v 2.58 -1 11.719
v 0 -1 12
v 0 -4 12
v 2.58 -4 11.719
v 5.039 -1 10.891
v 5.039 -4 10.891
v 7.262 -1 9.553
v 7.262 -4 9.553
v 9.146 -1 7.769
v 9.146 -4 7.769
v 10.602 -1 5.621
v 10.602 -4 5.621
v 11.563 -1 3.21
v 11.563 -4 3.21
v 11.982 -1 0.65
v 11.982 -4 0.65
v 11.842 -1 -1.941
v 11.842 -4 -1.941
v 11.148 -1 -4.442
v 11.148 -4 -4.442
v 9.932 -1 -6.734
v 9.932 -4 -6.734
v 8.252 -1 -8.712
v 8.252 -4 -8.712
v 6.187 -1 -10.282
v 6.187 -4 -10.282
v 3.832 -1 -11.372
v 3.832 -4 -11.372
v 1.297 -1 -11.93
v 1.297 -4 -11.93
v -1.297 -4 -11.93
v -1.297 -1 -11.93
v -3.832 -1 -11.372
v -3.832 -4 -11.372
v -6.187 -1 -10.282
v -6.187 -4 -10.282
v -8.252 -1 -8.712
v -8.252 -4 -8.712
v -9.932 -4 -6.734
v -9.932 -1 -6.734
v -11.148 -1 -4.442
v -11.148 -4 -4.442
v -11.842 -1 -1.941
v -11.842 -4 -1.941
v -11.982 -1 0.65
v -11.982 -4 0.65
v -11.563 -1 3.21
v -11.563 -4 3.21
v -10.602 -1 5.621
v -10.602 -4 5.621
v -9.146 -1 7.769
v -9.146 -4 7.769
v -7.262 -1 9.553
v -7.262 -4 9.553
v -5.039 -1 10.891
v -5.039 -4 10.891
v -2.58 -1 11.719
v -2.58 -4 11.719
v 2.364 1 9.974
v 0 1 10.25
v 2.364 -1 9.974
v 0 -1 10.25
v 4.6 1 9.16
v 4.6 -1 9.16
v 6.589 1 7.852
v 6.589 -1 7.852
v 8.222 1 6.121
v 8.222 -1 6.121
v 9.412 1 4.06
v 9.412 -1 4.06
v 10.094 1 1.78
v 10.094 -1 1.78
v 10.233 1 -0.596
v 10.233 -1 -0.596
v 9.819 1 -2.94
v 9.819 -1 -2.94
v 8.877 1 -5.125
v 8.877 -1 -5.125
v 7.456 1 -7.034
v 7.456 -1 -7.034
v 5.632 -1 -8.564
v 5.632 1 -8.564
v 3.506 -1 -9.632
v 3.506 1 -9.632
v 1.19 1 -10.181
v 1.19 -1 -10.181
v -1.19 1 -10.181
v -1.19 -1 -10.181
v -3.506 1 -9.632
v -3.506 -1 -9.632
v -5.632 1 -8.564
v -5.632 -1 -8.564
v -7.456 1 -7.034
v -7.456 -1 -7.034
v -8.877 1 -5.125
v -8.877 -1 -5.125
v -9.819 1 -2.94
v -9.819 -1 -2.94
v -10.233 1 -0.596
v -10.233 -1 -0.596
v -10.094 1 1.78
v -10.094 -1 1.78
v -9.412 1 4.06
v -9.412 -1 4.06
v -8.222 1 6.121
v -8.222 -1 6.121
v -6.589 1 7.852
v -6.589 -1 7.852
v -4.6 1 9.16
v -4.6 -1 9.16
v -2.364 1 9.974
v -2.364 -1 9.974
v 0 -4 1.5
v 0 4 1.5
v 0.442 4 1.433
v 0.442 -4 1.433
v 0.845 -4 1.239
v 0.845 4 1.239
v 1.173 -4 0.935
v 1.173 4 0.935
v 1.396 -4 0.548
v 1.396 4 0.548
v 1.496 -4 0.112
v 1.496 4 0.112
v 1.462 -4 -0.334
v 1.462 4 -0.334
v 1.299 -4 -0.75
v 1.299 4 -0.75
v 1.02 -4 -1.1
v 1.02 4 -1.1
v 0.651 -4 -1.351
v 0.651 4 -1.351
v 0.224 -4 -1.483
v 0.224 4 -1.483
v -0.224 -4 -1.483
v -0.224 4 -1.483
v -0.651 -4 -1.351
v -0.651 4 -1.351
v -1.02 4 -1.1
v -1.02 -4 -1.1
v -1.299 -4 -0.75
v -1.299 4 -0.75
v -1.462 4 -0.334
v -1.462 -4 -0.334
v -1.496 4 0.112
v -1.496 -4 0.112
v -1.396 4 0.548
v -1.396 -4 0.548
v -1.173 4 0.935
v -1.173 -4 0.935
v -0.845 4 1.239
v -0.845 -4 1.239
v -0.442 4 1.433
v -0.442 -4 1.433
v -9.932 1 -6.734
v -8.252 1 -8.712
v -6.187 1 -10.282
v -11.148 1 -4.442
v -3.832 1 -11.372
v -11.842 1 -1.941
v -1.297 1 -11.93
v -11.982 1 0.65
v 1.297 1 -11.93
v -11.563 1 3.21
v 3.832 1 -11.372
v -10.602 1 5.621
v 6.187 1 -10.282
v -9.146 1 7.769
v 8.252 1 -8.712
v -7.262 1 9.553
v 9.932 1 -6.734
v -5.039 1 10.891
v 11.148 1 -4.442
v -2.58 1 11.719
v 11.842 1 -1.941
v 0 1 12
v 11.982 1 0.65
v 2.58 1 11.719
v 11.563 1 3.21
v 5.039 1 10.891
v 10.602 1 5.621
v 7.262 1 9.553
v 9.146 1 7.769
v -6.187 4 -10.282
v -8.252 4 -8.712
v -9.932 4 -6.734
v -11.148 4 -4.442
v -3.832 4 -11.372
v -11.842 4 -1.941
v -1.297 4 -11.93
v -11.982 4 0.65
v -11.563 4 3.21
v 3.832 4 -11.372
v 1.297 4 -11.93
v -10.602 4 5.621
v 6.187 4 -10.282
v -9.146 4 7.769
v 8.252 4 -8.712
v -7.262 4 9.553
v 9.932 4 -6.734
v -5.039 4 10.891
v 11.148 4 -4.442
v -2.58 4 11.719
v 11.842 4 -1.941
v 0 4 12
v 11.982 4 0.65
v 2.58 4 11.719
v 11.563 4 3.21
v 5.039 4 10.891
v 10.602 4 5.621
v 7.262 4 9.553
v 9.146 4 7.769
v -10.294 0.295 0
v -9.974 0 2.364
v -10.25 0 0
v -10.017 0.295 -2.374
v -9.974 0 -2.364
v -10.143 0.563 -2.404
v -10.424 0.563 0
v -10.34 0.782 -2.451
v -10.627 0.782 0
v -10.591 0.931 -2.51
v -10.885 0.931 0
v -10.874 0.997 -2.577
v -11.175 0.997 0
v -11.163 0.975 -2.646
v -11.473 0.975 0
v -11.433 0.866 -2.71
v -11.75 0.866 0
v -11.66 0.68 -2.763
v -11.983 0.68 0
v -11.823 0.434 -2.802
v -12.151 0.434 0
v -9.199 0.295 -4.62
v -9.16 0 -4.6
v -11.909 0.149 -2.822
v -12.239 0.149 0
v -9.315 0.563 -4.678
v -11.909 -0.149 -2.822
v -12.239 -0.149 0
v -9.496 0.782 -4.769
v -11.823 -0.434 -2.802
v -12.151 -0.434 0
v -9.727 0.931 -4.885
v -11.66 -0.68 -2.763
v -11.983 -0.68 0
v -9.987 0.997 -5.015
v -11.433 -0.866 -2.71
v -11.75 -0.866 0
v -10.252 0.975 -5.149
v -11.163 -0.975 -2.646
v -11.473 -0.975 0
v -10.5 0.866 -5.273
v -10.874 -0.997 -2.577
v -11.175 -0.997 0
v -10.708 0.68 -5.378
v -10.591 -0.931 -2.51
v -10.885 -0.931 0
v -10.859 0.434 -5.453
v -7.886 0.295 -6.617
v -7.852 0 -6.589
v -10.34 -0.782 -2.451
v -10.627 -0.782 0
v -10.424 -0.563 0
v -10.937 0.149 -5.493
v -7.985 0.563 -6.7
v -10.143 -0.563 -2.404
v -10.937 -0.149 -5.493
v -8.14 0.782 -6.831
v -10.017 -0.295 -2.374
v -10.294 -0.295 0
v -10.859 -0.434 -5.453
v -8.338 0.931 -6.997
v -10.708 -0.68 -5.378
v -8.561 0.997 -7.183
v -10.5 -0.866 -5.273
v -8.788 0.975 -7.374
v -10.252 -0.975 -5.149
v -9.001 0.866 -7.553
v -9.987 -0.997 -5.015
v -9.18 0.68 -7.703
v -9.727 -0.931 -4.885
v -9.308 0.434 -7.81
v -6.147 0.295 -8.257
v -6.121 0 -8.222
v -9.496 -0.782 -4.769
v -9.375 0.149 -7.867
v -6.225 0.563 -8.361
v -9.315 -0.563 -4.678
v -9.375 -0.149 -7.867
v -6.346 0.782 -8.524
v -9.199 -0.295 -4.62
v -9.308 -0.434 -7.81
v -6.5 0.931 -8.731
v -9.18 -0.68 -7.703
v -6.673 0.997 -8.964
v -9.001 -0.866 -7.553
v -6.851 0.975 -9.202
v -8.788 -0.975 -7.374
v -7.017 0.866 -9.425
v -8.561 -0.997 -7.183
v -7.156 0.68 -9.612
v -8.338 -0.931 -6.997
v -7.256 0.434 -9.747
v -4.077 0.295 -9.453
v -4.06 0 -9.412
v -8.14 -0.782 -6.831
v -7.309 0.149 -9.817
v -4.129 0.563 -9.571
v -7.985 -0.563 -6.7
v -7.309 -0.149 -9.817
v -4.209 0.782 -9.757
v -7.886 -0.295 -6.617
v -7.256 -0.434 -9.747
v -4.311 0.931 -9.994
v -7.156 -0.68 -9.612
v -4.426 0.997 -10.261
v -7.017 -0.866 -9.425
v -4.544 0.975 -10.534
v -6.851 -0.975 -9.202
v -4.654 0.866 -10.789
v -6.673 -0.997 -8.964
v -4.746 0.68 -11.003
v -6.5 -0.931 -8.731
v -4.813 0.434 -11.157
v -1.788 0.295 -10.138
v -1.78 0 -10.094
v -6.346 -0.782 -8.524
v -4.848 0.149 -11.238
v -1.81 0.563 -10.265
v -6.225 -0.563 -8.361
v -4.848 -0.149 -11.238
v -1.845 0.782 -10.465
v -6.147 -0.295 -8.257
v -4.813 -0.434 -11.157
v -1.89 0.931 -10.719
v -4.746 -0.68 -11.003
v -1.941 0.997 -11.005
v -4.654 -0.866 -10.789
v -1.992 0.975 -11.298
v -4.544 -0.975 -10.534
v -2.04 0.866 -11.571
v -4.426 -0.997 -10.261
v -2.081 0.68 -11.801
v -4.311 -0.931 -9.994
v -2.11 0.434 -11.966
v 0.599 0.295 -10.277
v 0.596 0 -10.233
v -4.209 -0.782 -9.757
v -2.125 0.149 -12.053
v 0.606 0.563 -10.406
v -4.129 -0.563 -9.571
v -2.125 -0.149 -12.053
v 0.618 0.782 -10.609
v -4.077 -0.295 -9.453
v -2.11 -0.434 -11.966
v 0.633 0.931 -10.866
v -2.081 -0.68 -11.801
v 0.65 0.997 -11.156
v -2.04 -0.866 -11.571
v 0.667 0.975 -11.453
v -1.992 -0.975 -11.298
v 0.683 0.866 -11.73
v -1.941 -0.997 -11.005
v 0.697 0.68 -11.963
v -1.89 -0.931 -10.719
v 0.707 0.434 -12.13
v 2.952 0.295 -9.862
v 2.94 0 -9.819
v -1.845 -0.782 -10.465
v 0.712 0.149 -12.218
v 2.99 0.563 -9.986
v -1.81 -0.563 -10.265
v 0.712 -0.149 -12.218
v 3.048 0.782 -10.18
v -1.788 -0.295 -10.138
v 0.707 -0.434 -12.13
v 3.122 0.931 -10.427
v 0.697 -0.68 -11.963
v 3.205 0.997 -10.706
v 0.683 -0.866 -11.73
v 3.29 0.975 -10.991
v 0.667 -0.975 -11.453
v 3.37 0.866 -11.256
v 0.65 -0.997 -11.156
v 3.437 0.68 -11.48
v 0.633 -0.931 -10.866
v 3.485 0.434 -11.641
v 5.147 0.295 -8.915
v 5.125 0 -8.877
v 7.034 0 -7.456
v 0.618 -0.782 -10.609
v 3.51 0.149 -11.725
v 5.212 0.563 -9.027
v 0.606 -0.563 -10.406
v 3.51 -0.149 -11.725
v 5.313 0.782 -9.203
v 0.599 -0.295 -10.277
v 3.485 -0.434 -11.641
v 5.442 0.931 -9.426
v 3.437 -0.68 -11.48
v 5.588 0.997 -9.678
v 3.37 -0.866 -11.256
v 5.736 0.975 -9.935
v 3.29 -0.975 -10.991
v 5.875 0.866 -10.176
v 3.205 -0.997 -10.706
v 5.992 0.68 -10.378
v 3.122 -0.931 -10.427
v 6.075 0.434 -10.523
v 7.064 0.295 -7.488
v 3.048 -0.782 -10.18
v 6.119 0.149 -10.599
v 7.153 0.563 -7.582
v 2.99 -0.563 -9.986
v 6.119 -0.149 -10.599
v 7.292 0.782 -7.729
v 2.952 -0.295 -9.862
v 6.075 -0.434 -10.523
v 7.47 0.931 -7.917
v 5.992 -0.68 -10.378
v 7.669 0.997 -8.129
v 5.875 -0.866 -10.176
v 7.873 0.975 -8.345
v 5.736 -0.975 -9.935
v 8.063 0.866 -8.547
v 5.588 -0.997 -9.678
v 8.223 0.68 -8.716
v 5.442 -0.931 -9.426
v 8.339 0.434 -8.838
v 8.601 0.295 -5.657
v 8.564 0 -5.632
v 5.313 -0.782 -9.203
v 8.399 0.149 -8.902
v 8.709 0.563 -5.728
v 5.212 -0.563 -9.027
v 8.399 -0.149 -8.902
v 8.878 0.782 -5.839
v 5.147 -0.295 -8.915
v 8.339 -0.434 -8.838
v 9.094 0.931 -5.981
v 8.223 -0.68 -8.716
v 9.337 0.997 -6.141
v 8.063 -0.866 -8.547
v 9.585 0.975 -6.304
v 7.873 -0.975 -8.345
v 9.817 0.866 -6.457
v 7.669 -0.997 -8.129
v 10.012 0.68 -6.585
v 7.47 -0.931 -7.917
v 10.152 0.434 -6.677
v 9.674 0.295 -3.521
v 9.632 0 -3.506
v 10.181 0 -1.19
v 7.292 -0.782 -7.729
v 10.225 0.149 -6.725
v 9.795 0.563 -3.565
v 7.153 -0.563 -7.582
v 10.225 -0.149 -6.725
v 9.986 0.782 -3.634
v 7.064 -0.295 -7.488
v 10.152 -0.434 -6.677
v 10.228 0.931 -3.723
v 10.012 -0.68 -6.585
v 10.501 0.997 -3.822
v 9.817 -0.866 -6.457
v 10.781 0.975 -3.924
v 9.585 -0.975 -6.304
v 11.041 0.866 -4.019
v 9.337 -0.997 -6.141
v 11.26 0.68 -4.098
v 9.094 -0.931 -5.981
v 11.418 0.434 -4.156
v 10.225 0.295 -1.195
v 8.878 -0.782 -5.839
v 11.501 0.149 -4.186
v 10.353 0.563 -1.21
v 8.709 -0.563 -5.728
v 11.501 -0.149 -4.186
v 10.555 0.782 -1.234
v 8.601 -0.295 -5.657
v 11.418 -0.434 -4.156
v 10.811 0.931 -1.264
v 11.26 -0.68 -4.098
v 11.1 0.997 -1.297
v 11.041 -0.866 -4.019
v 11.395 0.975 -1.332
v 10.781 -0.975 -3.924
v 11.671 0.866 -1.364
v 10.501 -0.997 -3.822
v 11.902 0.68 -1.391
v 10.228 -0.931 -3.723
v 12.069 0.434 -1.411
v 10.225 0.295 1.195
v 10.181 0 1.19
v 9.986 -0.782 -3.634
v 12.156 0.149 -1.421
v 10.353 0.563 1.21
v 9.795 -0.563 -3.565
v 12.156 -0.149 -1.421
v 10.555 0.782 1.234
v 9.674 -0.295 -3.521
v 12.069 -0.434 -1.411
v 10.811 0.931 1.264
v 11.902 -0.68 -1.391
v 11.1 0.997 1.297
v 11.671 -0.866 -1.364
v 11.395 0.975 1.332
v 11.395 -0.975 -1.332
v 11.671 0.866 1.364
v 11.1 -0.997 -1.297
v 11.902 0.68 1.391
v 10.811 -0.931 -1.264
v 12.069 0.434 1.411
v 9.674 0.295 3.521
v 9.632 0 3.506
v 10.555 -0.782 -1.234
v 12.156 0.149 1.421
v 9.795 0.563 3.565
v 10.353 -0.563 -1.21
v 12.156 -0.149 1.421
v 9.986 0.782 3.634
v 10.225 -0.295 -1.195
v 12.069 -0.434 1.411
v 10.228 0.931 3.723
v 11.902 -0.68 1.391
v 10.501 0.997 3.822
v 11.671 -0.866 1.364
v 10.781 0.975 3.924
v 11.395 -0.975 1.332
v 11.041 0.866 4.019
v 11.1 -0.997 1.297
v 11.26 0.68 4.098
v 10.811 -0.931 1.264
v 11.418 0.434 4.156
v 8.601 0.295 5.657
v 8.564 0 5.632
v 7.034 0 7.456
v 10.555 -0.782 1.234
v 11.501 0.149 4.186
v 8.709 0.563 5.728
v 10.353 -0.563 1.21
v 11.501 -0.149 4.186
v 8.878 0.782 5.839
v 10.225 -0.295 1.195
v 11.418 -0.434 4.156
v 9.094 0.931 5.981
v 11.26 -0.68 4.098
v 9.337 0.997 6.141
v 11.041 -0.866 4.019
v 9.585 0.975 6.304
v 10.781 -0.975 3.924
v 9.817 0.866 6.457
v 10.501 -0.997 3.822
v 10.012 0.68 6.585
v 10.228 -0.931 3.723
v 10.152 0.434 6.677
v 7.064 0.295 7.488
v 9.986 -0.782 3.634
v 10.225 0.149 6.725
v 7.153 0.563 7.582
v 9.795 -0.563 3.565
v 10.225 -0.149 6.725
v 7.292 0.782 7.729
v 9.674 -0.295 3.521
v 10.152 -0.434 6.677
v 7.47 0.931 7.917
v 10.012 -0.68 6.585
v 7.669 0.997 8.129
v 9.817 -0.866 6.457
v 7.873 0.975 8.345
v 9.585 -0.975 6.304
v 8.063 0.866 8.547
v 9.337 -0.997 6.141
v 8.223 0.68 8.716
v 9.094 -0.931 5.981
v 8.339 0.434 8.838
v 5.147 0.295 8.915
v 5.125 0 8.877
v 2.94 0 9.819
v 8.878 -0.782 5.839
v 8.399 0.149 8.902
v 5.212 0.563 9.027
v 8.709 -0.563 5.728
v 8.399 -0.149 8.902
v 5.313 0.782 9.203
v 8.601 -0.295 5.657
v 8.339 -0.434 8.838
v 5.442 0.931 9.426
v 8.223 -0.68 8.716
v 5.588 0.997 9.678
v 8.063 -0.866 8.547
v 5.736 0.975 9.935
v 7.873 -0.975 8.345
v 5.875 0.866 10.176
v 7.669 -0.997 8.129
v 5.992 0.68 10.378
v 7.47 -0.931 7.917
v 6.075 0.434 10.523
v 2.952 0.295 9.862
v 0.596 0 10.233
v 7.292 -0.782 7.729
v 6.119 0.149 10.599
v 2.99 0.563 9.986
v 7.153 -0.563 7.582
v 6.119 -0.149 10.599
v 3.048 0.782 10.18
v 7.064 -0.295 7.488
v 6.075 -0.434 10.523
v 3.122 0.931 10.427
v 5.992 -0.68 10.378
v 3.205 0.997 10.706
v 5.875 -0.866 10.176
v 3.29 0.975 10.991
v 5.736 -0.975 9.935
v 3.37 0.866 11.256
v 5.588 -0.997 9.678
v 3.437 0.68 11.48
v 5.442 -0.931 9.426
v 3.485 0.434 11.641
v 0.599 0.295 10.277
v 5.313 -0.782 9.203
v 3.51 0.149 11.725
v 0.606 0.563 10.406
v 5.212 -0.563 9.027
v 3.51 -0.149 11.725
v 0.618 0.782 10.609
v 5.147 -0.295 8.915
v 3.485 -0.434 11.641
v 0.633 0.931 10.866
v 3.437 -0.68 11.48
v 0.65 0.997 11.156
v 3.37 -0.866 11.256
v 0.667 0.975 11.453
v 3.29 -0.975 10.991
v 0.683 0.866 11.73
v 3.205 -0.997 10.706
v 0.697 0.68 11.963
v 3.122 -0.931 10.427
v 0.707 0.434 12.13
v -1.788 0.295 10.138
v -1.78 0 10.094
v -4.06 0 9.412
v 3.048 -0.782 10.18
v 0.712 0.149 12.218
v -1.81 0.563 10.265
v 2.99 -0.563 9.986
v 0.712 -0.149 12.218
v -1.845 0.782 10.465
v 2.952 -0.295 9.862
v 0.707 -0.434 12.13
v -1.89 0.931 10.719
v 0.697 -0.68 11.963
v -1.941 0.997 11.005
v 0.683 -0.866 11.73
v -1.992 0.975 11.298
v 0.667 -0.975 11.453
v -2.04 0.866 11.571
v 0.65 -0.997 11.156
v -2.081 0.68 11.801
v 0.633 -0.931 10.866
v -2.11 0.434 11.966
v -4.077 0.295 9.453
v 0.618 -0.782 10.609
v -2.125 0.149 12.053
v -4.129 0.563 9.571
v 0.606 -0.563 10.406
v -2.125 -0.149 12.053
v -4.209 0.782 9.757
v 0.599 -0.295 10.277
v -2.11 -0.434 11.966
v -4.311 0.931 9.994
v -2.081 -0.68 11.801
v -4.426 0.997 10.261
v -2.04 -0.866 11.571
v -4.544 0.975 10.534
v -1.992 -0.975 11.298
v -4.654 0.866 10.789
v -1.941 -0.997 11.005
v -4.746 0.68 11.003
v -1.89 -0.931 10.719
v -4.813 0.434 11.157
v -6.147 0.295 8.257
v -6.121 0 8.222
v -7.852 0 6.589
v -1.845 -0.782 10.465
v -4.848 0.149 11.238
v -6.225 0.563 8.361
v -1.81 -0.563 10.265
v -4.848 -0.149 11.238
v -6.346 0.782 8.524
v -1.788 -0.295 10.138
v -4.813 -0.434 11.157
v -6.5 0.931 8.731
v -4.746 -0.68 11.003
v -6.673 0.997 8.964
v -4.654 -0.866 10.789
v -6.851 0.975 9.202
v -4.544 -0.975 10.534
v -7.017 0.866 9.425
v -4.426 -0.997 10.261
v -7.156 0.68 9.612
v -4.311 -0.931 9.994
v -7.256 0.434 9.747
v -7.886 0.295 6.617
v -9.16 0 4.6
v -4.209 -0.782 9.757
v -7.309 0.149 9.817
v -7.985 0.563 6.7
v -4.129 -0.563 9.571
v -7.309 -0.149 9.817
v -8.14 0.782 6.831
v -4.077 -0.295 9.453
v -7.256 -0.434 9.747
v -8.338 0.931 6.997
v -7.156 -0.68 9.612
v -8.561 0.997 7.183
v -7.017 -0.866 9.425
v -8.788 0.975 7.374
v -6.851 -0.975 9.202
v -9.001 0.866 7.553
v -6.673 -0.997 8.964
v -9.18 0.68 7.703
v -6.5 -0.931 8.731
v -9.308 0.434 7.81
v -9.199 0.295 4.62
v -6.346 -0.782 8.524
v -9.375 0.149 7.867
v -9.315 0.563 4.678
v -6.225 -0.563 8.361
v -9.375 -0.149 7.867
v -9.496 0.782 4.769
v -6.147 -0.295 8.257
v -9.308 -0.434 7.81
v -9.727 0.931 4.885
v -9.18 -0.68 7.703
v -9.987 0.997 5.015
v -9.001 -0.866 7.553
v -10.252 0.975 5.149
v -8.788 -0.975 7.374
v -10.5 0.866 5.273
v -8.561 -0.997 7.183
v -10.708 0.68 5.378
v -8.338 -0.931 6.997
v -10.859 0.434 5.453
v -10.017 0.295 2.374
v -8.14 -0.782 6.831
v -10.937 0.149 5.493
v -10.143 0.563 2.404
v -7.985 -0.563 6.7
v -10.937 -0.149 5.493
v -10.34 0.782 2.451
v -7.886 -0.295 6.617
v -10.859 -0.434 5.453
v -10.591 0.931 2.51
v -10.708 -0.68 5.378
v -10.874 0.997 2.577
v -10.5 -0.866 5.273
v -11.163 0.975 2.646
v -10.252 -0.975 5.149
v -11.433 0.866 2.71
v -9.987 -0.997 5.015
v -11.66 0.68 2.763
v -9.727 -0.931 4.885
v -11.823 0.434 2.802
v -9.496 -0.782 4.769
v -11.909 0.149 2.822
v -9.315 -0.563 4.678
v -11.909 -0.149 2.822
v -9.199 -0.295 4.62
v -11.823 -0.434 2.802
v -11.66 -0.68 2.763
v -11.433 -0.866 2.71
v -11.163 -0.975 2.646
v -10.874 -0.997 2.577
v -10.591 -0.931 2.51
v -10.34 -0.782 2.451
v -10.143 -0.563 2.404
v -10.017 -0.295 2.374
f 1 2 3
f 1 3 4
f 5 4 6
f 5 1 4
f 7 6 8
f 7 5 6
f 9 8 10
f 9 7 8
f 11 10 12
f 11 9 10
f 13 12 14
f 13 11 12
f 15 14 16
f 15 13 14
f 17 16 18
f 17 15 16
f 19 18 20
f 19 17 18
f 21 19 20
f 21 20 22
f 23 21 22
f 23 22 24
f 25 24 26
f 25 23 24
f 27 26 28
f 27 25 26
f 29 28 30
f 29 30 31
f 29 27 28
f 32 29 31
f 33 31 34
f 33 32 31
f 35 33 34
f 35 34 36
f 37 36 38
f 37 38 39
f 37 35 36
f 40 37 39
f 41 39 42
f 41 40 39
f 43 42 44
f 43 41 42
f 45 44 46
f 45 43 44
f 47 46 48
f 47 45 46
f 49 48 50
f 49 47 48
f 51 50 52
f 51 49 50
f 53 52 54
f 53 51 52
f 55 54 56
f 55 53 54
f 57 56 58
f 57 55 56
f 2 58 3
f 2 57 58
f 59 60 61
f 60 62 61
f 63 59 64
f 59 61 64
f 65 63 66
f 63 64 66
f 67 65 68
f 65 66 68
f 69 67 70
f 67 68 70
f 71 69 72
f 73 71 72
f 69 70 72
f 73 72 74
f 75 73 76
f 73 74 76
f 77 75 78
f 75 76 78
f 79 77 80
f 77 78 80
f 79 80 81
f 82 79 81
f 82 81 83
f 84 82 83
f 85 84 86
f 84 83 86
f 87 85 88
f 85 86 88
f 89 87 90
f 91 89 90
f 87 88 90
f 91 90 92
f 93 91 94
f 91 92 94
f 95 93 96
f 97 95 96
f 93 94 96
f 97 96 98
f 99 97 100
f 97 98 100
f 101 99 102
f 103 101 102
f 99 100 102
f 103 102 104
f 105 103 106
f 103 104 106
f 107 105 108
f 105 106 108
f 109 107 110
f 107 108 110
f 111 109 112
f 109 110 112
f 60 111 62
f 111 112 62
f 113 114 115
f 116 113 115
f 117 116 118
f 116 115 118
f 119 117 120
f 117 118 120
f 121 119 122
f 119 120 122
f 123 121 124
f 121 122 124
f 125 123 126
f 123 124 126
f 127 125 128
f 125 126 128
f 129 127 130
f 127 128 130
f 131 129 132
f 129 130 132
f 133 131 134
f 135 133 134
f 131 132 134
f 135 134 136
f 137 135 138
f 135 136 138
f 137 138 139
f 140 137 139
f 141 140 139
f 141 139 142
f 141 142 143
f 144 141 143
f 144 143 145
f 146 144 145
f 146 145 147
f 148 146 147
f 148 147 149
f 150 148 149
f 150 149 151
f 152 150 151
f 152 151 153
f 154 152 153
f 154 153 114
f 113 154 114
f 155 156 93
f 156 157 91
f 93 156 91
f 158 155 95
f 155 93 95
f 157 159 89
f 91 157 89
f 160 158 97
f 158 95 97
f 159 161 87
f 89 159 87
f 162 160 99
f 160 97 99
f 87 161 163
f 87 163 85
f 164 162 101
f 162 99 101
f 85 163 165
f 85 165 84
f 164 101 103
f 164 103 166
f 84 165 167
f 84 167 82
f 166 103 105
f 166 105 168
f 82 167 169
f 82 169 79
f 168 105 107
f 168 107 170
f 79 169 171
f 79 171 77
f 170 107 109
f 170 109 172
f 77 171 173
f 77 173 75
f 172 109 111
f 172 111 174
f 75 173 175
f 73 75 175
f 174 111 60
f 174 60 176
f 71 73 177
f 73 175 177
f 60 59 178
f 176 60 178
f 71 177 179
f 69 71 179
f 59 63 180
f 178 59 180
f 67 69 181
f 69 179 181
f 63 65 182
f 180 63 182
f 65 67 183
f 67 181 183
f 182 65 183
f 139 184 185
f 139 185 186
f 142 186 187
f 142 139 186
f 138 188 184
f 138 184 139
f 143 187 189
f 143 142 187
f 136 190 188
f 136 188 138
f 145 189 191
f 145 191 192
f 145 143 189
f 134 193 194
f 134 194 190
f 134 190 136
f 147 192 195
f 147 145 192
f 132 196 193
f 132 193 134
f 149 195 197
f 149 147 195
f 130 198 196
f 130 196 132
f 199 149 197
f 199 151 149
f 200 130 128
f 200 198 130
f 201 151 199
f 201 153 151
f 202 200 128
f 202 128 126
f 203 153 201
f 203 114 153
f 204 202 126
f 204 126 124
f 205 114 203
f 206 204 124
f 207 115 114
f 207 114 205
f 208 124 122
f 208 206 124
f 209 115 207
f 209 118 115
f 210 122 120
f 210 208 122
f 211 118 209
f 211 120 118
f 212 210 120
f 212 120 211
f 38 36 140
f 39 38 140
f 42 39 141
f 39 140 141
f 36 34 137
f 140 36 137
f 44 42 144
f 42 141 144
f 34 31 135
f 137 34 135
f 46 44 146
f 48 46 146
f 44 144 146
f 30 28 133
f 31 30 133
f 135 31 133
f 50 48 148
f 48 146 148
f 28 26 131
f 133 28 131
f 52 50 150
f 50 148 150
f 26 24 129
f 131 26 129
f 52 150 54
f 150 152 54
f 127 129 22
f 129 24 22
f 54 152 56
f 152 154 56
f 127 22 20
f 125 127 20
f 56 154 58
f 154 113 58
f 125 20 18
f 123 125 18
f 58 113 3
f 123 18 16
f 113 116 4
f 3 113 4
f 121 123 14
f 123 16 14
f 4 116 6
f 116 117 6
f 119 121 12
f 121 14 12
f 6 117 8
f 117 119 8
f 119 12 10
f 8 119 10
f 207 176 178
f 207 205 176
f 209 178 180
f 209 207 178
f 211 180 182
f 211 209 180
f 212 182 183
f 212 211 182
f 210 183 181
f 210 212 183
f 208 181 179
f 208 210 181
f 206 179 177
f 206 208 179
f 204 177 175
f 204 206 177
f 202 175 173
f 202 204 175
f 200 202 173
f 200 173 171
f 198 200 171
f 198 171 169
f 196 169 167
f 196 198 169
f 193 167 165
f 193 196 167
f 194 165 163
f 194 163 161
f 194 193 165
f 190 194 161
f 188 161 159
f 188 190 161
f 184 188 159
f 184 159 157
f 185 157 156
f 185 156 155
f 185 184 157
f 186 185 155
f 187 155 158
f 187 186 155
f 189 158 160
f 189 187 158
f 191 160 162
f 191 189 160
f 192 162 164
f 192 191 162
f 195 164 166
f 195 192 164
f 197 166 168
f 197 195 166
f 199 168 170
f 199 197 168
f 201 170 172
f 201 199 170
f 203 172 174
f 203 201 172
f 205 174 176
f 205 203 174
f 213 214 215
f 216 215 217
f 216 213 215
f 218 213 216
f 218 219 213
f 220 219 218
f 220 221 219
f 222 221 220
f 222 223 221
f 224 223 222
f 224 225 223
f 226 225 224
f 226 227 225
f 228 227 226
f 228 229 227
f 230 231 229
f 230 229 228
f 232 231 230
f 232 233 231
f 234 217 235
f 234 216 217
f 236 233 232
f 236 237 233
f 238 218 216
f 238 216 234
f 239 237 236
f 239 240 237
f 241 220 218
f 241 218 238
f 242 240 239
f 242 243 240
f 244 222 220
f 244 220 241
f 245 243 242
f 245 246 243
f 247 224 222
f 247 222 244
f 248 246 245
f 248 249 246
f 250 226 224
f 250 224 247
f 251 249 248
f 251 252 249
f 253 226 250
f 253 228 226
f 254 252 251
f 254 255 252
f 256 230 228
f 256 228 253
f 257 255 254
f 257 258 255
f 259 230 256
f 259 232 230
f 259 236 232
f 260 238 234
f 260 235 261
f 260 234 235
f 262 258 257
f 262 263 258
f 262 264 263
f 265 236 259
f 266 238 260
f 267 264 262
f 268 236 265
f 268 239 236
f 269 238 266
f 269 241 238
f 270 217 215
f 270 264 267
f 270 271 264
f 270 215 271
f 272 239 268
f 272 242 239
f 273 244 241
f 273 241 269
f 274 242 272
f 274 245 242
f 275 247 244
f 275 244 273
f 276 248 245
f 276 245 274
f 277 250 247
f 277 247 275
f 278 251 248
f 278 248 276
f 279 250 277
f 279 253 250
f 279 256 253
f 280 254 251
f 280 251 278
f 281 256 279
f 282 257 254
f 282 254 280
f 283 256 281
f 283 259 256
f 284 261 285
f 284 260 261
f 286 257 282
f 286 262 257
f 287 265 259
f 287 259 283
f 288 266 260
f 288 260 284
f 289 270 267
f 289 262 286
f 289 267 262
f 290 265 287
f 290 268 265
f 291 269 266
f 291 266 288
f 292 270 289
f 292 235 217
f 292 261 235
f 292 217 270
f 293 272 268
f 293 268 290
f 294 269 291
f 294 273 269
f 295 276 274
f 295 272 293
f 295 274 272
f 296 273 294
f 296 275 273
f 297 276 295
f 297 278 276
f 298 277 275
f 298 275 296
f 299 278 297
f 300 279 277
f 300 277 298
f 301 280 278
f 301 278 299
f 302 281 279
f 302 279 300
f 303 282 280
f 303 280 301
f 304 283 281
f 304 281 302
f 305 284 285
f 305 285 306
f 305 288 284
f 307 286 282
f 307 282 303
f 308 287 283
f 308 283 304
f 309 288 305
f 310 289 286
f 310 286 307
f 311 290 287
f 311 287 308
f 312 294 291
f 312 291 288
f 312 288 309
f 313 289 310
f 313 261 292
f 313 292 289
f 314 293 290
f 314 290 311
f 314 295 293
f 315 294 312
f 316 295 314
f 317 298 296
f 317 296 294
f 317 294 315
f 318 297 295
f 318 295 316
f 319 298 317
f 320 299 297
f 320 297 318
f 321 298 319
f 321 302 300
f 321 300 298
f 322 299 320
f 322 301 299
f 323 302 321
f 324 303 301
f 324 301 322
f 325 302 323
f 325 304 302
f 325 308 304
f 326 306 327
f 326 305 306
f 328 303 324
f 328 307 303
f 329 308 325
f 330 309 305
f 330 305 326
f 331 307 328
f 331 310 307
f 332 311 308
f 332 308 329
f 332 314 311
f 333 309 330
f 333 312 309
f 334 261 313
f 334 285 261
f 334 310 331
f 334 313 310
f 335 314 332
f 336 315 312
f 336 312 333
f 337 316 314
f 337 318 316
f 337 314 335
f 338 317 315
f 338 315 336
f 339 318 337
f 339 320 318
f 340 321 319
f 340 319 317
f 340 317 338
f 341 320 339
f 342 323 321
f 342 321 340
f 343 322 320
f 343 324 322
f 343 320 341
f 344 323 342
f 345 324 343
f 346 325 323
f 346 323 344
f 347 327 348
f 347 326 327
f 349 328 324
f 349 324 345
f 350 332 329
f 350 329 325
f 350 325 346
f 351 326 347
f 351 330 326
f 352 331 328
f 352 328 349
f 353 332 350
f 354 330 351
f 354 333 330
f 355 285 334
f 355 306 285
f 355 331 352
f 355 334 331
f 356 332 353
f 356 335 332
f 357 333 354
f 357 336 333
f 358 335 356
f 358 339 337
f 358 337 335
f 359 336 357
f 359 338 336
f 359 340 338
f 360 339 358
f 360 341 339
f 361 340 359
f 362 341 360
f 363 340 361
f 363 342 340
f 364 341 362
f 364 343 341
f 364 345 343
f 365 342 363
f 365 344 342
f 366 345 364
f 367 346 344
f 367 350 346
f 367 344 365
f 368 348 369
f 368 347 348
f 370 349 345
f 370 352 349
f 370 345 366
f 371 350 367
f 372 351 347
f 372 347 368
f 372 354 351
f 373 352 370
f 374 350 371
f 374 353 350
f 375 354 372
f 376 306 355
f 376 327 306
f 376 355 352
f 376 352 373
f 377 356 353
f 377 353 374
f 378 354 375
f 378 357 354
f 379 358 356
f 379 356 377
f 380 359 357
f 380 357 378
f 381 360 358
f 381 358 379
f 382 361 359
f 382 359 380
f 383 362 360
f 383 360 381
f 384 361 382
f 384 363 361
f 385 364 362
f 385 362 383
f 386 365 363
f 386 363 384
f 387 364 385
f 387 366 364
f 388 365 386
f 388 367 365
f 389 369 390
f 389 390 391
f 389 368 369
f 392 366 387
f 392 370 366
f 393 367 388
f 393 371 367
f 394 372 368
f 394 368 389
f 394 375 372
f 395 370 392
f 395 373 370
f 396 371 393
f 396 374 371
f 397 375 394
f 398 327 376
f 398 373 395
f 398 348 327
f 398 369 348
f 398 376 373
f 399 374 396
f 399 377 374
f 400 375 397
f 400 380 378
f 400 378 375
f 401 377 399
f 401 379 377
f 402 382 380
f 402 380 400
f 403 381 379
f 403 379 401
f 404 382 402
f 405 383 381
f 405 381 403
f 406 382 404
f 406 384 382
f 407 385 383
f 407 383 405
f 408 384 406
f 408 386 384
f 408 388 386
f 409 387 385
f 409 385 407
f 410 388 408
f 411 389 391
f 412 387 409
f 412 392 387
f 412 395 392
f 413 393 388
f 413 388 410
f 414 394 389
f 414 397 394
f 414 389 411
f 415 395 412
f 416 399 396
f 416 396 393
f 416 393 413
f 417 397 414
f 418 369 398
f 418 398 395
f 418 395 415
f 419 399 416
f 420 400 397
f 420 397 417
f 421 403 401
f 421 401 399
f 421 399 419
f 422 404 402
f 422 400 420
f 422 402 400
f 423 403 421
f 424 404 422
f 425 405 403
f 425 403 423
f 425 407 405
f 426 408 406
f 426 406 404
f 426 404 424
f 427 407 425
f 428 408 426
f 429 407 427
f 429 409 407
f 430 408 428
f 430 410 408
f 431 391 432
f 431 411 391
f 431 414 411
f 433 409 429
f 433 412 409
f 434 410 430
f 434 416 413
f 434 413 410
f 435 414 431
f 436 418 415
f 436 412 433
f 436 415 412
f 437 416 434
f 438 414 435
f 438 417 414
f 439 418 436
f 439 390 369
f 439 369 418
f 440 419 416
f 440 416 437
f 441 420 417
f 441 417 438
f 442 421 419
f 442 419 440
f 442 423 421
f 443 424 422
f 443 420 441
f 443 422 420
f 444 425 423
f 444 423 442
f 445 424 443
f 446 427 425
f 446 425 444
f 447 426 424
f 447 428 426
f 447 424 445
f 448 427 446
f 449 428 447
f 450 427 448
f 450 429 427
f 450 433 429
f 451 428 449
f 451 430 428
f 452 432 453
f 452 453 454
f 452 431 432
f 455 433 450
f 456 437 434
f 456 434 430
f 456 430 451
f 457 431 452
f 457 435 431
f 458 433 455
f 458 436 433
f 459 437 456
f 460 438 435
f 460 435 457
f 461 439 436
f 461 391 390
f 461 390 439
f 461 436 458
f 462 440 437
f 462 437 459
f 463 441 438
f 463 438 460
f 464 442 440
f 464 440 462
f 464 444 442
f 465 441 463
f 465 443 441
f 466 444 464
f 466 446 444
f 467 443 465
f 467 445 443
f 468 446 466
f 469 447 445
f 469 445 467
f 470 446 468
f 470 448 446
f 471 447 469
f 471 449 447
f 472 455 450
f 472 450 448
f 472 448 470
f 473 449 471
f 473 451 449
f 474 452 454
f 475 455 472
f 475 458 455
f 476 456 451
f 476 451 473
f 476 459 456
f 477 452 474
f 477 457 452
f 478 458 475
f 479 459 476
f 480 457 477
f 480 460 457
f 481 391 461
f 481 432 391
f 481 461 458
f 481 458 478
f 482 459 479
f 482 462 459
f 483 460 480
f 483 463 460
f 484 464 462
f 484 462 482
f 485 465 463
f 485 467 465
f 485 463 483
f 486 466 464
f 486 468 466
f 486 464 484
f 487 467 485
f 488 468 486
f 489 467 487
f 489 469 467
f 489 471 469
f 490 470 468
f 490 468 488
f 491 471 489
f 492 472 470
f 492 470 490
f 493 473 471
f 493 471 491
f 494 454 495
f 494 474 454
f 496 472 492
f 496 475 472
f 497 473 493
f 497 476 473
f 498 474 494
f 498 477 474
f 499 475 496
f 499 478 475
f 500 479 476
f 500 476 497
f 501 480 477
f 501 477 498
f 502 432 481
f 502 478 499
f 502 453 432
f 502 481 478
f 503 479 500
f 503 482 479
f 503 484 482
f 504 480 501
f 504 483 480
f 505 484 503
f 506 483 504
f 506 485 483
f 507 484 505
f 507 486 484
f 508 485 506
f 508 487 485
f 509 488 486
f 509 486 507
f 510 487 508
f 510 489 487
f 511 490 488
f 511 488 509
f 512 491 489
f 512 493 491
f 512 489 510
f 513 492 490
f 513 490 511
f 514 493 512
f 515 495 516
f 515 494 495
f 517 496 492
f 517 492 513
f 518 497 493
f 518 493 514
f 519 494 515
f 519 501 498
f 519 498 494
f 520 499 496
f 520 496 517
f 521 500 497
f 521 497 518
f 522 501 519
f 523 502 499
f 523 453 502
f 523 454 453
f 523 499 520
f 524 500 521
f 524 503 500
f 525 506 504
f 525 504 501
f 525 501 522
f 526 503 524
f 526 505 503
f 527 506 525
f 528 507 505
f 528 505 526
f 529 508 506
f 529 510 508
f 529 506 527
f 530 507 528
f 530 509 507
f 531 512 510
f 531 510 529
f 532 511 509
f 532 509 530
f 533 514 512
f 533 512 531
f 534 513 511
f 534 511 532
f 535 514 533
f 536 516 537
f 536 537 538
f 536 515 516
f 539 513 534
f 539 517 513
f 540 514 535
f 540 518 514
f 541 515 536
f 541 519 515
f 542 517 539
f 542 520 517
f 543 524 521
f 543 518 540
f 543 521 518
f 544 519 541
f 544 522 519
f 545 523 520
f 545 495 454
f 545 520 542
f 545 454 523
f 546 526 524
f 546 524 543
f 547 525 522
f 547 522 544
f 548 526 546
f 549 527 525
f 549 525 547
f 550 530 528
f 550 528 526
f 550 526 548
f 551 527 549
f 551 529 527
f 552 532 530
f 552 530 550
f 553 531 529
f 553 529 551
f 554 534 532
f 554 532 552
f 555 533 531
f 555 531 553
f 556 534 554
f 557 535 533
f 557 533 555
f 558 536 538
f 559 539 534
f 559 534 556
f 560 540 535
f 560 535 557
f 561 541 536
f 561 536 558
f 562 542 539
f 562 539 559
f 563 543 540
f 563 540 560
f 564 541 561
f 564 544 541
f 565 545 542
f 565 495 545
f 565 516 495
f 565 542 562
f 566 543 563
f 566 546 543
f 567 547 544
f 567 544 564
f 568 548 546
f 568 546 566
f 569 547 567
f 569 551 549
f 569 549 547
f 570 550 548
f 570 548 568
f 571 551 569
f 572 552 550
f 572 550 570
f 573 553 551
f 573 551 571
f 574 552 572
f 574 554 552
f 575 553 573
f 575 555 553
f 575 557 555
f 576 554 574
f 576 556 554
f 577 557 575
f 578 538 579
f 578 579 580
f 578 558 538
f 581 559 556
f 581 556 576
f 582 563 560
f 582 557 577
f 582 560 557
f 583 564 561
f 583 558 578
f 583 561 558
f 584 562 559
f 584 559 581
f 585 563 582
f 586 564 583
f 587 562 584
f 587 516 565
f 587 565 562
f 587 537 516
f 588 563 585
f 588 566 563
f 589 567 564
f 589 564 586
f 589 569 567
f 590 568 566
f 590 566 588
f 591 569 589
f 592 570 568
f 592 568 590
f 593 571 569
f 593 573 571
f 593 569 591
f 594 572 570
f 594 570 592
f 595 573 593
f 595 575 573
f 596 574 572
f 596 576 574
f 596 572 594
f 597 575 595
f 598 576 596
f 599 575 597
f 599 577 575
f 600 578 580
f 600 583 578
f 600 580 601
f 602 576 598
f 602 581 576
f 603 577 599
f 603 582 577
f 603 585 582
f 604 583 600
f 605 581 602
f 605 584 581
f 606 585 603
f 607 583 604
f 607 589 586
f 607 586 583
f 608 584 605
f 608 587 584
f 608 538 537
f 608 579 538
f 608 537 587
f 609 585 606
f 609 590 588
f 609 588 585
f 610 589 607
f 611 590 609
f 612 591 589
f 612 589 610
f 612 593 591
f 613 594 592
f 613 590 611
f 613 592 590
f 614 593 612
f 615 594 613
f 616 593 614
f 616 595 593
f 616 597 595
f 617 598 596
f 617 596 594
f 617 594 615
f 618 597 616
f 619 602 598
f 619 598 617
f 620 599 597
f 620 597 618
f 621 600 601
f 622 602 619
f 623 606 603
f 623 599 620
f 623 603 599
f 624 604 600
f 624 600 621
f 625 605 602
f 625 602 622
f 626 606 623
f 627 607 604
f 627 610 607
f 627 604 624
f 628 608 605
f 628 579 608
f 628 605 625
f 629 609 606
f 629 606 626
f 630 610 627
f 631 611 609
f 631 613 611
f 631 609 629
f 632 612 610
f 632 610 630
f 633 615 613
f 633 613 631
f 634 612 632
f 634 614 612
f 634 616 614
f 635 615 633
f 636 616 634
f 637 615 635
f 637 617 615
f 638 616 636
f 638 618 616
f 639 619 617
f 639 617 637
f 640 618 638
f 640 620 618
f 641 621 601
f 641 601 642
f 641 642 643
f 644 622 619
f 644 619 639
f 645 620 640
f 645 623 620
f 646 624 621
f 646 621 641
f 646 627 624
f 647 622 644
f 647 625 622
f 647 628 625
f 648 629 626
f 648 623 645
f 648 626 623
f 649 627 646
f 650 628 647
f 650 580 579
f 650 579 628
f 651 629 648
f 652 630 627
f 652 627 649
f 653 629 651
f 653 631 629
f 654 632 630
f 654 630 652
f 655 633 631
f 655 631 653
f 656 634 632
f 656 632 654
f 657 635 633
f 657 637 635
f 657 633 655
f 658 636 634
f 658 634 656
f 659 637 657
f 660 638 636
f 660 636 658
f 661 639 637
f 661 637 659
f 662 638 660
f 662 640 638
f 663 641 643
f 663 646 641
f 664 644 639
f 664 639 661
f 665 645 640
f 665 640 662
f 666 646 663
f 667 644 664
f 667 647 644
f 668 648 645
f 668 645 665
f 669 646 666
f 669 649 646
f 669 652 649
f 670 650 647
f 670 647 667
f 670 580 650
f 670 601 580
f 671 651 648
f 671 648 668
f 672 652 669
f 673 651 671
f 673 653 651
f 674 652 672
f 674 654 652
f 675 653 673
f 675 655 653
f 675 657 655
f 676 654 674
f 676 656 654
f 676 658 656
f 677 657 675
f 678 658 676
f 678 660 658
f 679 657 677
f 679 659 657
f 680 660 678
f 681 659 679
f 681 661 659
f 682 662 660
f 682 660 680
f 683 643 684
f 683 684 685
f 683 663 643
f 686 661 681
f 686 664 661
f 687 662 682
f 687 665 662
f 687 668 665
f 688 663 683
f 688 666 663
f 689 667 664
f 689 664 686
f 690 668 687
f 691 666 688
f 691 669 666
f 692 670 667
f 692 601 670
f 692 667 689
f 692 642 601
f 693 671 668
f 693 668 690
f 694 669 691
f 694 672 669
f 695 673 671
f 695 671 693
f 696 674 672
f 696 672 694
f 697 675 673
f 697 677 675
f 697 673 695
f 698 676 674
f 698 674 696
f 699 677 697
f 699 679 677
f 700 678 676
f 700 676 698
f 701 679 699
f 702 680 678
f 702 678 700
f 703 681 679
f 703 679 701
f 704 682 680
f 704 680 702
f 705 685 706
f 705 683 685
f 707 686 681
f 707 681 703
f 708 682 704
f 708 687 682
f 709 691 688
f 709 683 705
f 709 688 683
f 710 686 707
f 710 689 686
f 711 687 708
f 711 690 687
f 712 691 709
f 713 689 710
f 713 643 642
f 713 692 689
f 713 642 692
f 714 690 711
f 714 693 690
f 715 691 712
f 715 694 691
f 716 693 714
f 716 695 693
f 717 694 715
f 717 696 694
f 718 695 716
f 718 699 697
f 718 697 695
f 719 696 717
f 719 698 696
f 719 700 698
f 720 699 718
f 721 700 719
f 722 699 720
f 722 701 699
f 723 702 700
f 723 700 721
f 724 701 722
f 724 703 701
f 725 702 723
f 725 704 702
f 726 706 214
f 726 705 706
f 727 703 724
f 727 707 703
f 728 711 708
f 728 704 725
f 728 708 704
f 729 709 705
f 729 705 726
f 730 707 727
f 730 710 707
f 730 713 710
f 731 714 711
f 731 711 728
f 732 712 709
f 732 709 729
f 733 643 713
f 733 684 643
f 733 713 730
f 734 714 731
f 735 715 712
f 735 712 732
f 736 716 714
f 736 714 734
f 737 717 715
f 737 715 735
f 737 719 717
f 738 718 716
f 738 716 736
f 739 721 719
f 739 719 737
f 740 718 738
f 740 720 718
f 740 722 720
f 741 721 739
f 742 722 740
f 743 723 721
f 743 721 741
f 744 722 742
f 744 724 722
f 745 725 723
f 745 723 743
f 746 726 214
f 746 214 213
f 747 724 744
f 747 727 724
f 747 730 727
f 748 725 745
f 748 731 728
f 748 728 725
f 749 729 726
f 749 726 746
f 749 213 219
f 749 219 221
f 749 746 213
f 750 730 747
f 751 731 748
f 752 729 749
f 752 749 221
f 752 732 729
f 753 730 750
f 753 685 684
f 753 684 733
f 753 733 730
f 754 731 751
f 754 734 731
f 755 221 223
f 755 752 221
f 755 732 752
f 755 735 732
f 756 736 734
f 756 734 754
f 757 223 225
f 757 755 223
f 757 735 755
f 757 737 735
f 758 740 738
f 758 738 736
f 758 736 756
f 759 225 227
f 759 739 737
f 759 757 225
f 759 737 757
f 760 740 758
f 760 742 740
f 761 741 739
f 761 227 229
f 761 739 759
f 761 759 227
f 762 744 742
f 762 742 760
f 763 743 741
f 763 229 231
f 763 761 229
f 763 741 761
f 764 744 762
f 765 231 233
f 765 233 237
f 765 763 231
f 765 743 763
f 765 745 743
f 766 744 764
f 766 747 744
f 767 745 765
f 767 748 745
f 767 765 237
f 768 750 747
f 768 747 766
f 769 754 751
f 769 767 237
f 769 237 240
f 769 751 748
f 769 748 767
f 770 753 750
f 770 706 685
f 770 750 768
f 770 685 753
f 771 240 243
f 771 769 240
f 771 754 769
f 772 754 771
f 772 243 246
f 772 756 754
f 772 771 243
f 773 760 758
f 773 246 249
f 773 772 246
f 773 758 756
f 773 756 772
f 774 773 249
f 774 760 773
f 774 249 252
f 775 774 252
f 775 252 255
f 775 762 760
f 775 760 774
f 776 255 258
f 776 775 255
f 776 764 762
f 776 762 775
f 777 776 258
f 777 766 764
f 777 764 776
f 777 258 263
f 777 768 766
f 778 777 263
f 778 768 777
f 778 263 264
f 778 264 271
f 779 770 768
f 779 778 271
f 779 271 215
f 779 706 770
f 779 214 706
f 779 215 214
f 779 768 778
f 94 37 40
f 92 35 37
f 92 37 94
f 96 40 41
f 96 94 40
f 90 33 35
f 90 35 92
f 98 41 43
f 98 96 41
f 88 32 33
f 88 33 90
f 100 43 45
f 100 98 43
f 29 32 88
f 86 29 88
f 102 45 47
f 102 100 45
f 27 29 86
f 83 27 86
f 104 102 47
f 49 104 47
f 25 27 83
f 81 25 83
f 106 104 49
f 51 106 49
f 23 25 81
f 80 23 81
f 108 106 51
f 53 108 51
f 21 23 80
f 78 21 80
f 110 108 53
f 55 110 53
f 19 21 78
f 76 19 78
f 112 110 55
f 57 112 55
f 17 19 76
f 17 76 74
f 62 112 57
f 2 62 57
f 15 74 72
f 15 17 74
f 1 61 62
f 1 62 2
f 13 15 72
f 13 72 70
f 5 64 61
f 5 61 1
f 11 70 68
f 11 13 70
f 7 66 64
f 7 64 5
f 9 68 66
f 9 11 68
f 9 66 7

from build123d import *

# Parameters (mm, degrees)
SKETCH1_R           = 12
BOSS_EXTRUDE1_DEPTH = 4
SKETCH2_R           = 12
SKETCH2_R_2         = 10.25
CUT_EXTRUDE1_DEPTH  = 1
SKETCH3_R           = 1
SKETCH4_R           = 1.5
CUT_EXTRUDE2_DEPTH  = 20.082059766


with BuildPart() as part:
    # Sketch1 → Boss-Extrude1 (new, symmetric)
    with BuildSketch(Plane(origin=(0, 0, 0), x_dir=(1, 0, 0), z_dir=(0, 1, 0))):
        with Locations(Location((0, 0, 0), (0, 0, 270))):
            Circle(SKETCH1_R)
    extrude(amount=BOSS_EXTRUDE1_DEPTH, both=True)

    # Sketch2 → Cut-Extrude1 (cut, symmetric)
    with BuildSketch(Plane(origin=(0, 0, 0), x_dir=(1, 0, 0), z_dir=(0, 1, 0))):
        with Locations(Location((0, 0, 0), (0, 0, 270))):
            Circle(SKETCH2_R)
        with Locations(Location((0, 0, 0), (0, 0, 270))):
            Circle(SKETCH2_R_2, mode=Mode.SUBTRACT)
    extrude(amount=CUT_EXTRUDE1_DEPTH, both=True, mode=Mode.SUBTRACT)

    # Sketch4 → Cut-Extrude2 (cut, through all)
    with BuildSketch(Plane(origin=(0, 4, 0), x_dir=(1, 0, 0), z_dir=(0, 1, 0))):
        with Locations(Location((0, 0, 0), (0, 0, 270))):
            Circle(SKETCH4_R)
    extrude(amount=-CUT_EXTRUDE2_DEPTH, mode=Mode.SUBTRACT)


with BuildPart() as body_2:
    # Sketch3 → Revolve1 (revolve)
    with BuildSketch(Plane.XY):
        with Locations((-11.25, 0)):
            Circle(SKETCH3_R)
    revolve(axis=Axis((0, 4, 0), (0, -1, 0)))


solid = Compound([part.part, body_2.part])
